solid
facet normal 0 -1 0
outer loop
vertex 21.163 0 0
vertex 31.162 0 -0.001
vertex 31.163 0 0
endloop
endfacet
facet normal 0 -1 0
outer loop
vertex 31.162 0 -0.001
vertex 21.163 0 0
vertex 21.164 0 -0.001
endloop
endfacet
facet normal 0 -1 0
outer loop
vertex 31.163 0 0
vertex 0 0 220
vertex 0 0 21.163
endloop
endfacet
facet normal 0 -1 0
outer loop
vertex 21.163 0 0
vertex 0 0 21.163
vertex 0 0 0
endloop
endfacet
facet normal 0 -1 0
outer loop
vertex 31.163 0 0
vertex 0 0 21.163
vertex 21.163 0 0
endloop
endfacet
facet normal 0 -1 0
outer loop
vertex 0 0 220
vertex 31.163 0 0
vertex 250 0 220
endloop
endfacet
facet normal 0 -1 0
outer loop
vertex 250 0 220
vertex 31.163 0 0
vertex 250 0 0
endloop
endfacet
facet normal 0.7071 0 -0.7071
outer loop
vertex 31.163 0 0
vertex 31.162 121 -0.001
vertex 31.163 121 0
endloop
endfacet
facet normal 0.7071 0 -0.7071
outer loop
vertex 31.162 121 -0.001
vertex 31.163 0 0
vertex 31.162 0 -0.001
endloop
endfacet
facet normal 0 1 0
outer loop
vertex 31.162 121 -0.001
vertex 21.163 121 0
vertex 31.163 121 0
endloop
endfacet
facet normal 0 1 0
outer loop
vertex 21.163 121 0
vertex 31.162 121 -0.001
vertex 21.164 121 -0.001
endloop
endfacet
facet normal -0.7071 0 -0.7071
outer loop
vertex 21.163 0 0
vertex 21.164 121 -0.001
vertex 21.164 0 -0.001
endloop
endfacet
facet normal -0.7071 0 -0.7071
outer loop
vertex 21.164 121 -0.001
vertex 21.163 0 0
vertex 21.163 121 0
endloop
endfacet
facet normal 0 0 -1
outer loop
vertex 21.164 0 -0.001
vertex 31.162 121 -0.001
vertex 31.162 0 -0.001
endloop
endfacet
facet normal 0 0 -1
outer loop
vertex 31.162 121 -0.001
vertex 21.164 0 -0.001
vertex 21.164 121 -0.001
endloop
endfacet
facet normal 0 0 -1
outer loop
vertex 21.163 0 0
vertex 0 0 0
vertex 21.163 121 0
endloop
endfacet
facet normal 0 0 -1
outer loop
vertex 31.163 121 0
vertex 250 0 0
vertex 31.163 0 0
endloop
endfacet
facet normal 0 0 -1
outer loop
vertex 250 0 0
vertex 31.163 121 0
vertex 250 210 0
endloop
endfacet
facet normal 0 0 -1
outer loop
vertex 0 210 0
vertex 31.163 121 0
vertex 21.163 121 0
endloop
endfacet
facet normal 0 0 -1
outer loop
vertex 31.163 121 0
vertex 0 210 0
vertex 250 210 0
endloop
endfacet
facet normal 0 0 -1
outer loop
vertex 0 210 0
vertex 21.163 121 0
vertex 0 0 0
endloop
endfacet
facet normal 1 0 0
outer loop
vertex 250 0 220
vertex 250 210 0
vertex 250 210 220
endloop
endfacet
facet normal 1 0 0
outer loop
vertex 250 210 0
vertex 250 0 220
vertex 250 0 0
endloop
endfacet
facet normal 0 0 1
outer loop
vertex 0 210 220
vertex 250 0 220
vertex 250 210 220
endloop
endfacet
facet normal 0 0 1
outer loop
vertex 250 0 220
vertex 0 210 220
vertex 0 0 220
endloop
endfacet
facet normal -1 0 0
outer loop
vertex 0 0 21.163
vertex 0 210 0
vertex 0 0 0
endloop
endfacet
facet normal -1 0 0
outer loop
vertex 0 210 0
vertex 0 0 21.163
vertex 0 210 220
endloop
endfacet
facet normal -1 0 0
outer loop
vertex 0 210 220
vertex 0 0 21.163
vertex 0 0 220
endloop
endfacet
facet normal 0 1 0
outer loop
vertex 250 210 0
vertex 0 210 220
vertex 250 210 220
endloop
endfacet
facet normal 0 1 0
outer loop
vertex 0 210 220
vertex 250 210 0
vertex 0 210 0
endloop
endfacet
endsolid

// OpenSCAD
$fa = 2;    // minimum angle (fine resolution)
$fs = 0.4;  // minimum size (fine resolution)

use <drawer.scad>  // reusable primitives

epsilon = 0.001;
sq2 = sqrt(2);
northeast = [cos(45), sin(45), 0];
v110 = [1, 1, 0];


leftcard = 12;

length = 278;  // confirmed
width = 121;   // confirmed
height = 27;

tokenwidth = 15;
tokenthickness = 3;
tokenlength = 55;
tokendepth = 12;

clearances_thick = [0.3, 0.4, 0.5];
clearances_width = [0.3, 0.4, 0.5];

clearance_thick = 0.35;
clearance_width = 0.4;

sleevedsmallheight = 73;
sleevedsmallwidth = 46;

cardslength = sleevedsmallwidth + 4;
cardsthickness = 4.5;
cardsdepth = 25;
cardsceiling = sleevedsmallwidth + 2 - cardsdepth;

shoulder_width = 4;
shadow_line_width = 7;
shoulder_overlap = 10;
shoulder_clearance = 0.5;
shoulder_cover_thickness = 1;
tab_relief = 2;

// covers_gap = 4; // need space because single block has two partial caps
covers_gap = 0; // use single full cap, print on diagonal
cap_thickness = 4;
full_cap_chamfer_width = 10; // 0.75 * cap_thickness;
capheight = shoulder_overlap + cardsceiling + cap_thickness;
echo(capheight=capheight);


/*
  -------
       ------
  -------
       ------
       ⋮
  -------
       ------

length == 18.5 * stride + sep / 2 + smallsep + 2 * shoulder_width + 2 * covers_gap
sep = stride - cardsthickness  // distance between cards, also half distance 
                               // from cards to edge

 length == 18.5 * stride + stride / 2 - cardsthickness / 2 + smallsep + 2 * shoulder_width + 2 * covers_gap


∴ length = 19 * stride + 2 * shoulder_width - cardsthickness / 2 + smallsep + 2 * covers_gap

  
*/

smallsep = 2;
stride = (length + cardsthickness / 2 - 2 * shoulder_width - 2 * covers_gap - smallsep) / 19;
sep = stride - cardsthickness;
//echo (sep=sep);



//
//\draw (-1,-1) rectangle +(131,284);
//\draw (0,0) rectangle +(129,282);
//\foreach \i in {0,...,17} {
//  \draw ($(\leftcard,\i*\stride+12.5)$) rectangle +(50mm,4.5mm);
//  \draw ($(\leftcard+54,\i*\stride+12.5)$) rectangle +(50mm,4.5mm);
//}
//\foreach \i in {0,...,17} {
//  \draw ($(9,\i*\stride+6+4.25)$) node[rotate=-45,minimum width=16mm,minimum height=3.8mm,draw] { };
//  \draw ($(9+110,\i*\stride+6+4.25)$) node[rotate=45,minimum width=16mm,minimum height=3.8mm,draw] { };
//}
//\foreach \i in {1,2} {
//  \draw ($(64.5,\i*6*\stride+0.3*\stride+2)$) node [minimum height=2mm,minimum width=80mm,draw]{};
//}

//anti_chamfer_sw(5,30,hi_corner = true,lo_corner = true);


//module undercube(r) {
//  translate([0,0,-r.z]) cube(r);
//}
//
//cube([1,1,1]);
//
//sq2 = sqrt(2);
//
//v = [1,0,0];
//
//translate(-v)
//translate([1-sq2,0,0])
//%undercube([sq2,sq2,sq2]);



module chamfers_test() {
  difference () {
    cube([60,60,15]);
//    translate([15,20,15+epsilon])
//      union () {
//       anti_chamfer_south(5+epsilon,30,lo_corner = true);
//        translate([0,-7,-15])
//          union () {
//          cube([30,7+epsilon,15+epsilon]);
//          translate([epsilon,0,15+epsilon])
//          anti_chamfer_east(5,7,hi_corner = true);
//        }
//      }
    translate([10,40,15-5]) chamfered_well([30,7,5+epsilon],depth=2+epsilon);
  }
}

//chamfers_test();

//translate([0,-30,0]) chamfered_well([30,7,15], 5);


module tokens_test() {
  sep=6;
  depth = 15;
  surround = 3;
  height = depth + 5;

  module well(i) {
    translate([sep + i * (tokenthickness + sep), surround, height-depth+epsilon])
    chamfered_well([tokenthickness+clearances_thick[i],
                    tokenwidth + clearances_width[i],
                    depth],
                   depth=1);
  }

  difference () {
    cube([sep + 3 * (tokenthickness + sep), tokenwidth + 2 * surround, height]);
    well(0);
    well(1);
    well(2);
  }
}

module left_unit () {
  tlen = tokenwidth + clearance_width;
  twid = tokenthickness + clearance_thick;
  tinysep = 2;
  union () {
    translate([0, tlen * sin(45), height - tokendepth])
      rotate([0,0,-45])
      chamfered_well([tlen, twid, tokendepth], depth=1);
    shift = (tlen/2 + twid + tinysep) * northeast;
    lift(height-cardsdepth)
    translate(shift)
      chamfered_well([cardslength,cardsthickness,cardsdepth], 2);
  }
}

module right_unit() {
  mirror([1,0,0]) left_unit();
}

unit_shift = 4;

module unit_test() {
  difference() {
    cube([68, stride + sep / 2 + smallsep, height]);
    translate([unit_shift, smallsep, epsilon])
      left_unit();
  }
}

//translate([0,50,0]) tokens_test();

//translate([-80,-30,0]) unit_test();

// XXX TODO cap needs to be enlarged by clearance!

wedge_clearance = 0.5;
wedgelen = 30;
tablen = wedgelen / 2 - shoulder_width / 4;
tabheight = shoulder_overlap - tab_relief - 1;

module wedge(len, blowup = 1) {
  depth = shoulder_width / 2 + unit_shift - 2;
  translate([0, len * blowup, 0])
    rotate([90,0,0])
    scale(blowup)
    linear_extrude(len)
    polygon([[0,0], [depth, depth/2], [0, tabheight]]);
}

function caplen(groups_covered) = let (
  extra = groups_covered == 1 ? smallsep : sep / 2 - stride / 2
  ) (groups_covered * 6 + 0.5) * stride +
           shoulder_width + extra + (groups_covered - 1) * 2 * covers_gap;


module partial_cap(groups_covered) {
  extra = groups_covered == 1 ? smallsep : sep / 2 - stride / 2;

  difference () {
    cube([width, caplen(groups_covered), capheight]);
    translate(shoulder_width * v110)
      lift(cap_thickness)
      cube([width - 2 * shoulder_width, caplen(groups_covered), capheight]);
    translate(shoulder_width / 2 * v110)
      lift(cap_thickness + cardsceiling)
      cube([width - shoulder_width, caplen(groups_covered), capheight]);
    
  }
  translate([shoulder_width / 2 - epsilon, caplen(groups_covered) - tablen, capheight - tab_relief ])
    mirror([0,0,1]) wedge(tablen);
  translate([width - shoulder_width/2 + epsilon, caplen(groups_covered) - tablen, capheight - tab_relief])
    mirror([0,0,1]) mirror([1,0,0]) wedge(tablen);
}

module full_cap(chamfer_angle = 45) {
  // XXX TODO thumb holes
  // XXX TODO text
  delta = shoulder_cover_thickness;
  difference () {
    cube([width, length, capheight]);
    translate(delta * v110)
      translate([0,0, capheight - shoulder_overlap])
      cube([width - 2 * delta, length - 2 * delta, capheight]);
    translate(shoulder_width * v110)
      translate([0,0, cap_thickness])
      cube([width - 2 * shoulder_width, length - 2 * shoulder_width, capheight]);
//    translate([-epsilon, -epsilon, -epsilon])
//      mirror([0,0,1])
//      anti_chamfer_south(full_cap_chamfer, width + 2 * epsilon);
//    translate([-epsilon, length + epsilon, -epsilon])
//      mirror([0,0,1])
//      anti_chamfer_north(full_cap_chamfer, width + epsilon * 2);
    w = full_cap_chamfer_width;
    translate([-epsilon, w * cos(chamfer_angle), -epsilon])
      rotate([90 - chamfer_angle, 0, 0])
      translate([0,-length,0])
      cube([width + 2 * epsilon, length, capheight]);
    translate([-epsilon, length - w * cos(chamfer_angle), -epsilon])
      rotate([chamfer_angle - 90, 0, 0])
      cube([width + 2 * epsilon, length, capheight]);
  }
  translate([shoulder_cover_thickness - epsilon, (length - wedgelen) / 2, capheight - tab_relief ])
    mirror([0,0,1]) wedge(wedgelen);
  translate([width - shoulder_cover_thickness + epsilon, (length - wedgelen) / 2, capheight - tab_relief])
    mirror([0,0,1]) mirror([1,0,0]) wedge(wedgelen);
}

module tilted_full_cap(theta=45) {
  w = full_cap_chamfer_width;
  translate([0,width,0])
  rotate([0,0,-90])
  translate([0, (capheight - w * sin(theta)) * sin(theta), 0])
  translate([0,w,0])
  rotate([theta, 0, 0])
    translate([0, - w * cos(theta), 0])
    full_cap(theta);
}
    

module supported_full_cap(theta=45) {
  tilted_full_cap(theta);


  fin_length = 0.55 * length;
  fin_thickness = 2;
  fin_gap = 0.75;
  fin_base_length = fin_length * cos(theta);
  fin_height = fin_length * sin(theta);
  fin_base_width = 40;
  w = full_cap_chamfer_width;

  module anti_tooth(d, h) {
    translate([-d/2, -d/2, -h/2])
    cube([d, d, h]);
  }

  module unplaced_sprue() {
    thickness = 0.5;  // from video
    tooth = 0.25;
    length = fin_gap / sin(theta)  + thickness / tan(theta);
    translate([thickness / tan(theta) - length + epsilon, -thickness/2, 0])
      difference() {
        cube([length, thickness, thickness]);
        translate([tooth/cos(theta),0,thickness/2])
          rotate([0, -theta-90, 0])
          anti_tooth(d=tooth, h = 2 * thickness / sin(theta));
        translate([tooth/cos(theta),thickness,thickness/2])
          rotate([0, -theta-90, 0])
          anti_tooth(d=tooth, h = 2 * thickness / sin(theta));
    }
  }

  sprue_vertical_spacing = 10;

  module sprue(i) {
    translate([i * sprue_vertical_spacing / tan(theta), 0, i * sprue_vertical_spacing])
      unplaced_sprue();
  }


  translate([fin_gap / sin(theta),0,0])
  translate([w + (capheight - w * sin(theta)) * sin(theta),width/2,0])
    union () {
      sprue(0);
      for(i=[1:fin_height/sprue_vertical_spacing])
        sprue(i);
      translate([0, fin_thickness/2, 0])
      rotate([90,0,0])
        linear_extrude(fin_thickness)
        polygon([[0,0], [fin_base_length, 0], [fin_base_length, fin_length * sin(theta)]]);
      linear_extrude(fin_thickness)
        hull() {
        translate([10 - 2.5, 0, 0]) circle(r=2.5);
        offset = fin_base_width / 2 + 5;
        translate([fin_base_length - 5, offset, 0])  circle(r=5);
        translate([fin_base_length - 5, -offset, 0]) circle(r=5);
        }
  }

}


module block () { 
  difference () {
    delta = shoulder_cover_thickness + shoulder_clearance;
    union () { // make block with shoulders
      cube([width, length, height - (shoulder_overlap + shadow_line_width)]);
        translate(delta * v110)
        cube([width - 2 * delta, length - 2 * delta, height]);
    }
    for (i = [0:1:17]) {
      gap = i >= 12 ? 2 * covers_gap : (i >= 6 ? covers_gap : 0);
      translate([unit_shift + shoulder_width,
                 shoulder_width + gap + smallsep + i * stride,
                 epsilon])
        render () left_unit();
      translate([width - unit_shift - shoulder_width, shoulder_width + gap + smallsep + i * stride + stride/2, epsilon])
        render () right_unit();
    }
    wedgeheight = height - shoulder_overlap + tab_relief;
    translate([shoulder_width/2 - epsilon, caplen(1) - wedgelen/2, wedgeheight]) wedge(wedgelen);
    translate([width - shoulder_width/2 + epsilon, caplen(1) - wedgelen/2, wedgeheight]) mirror([1,0,0]) wedge(wedgelen);
  }
}

module line (y = 0) {
  translate([0, y - 0.1, height - 5])
    color ("blue") cube([1.5* width, 0.2, 7]);
}


module green() { color("#080") children(); }

if (false) {
  line(0);
  color("red") line(shoulder_width/2);
  line(shoulder_width);
  line(shoulder_width +smallsep);
  line(shoulder_width +smallsep + 1 * stride);
  color("red") line(shoulder_width +smallsep + 1.5 * stride);
  line(shoulder_width +smallsep + 6 * stride);
  line(shoulder_width +smallsep + 6 * stride + covers_gap);
  color("red") line(shoulder_width +smallsep + 6.5 * stride);
  color("red") line(shoulder_width +smallsep + 6.5 * stride + 2 * covers_gap);
  color("red") line(shoulder_width +smallsep + 12.5 * stride);
  color("red") line(shoulder_width +smallsep + 12.5 * stride + 2 * covers_gap);
  line(shoulder_width +smallsep + 12 * stride + covers_gap);
  line(shoulder_width +smallsep + 12 * stride + 2 * covers_gap);
  line(shoulder_width +smallsep + 18 * stride + 2 * covers_gap);
  line(shoulder_width +smallsep + 18.5 * stride + 2 * covers_gap);
  line(shoulder_width +smallsep + 18.5 * stride + 2 * covers_gap + sep/2);
  line(shoulder_width +smallsep + 18.5 * stride + 2 * covers_gap + sep/2 + shoulder_width);

  green() line(length - shoulder_width - sep/2);
  green() line(length - shoulder_width - sep/2 - cardsthickness);
//  translate([5, 0,0]) green() line(length - shoulder_width - sep/2 - 12 * stride - 2 * covers_gap);
  translate([10, 0,3]) color("#0ff") line(length - (shoulder_width + sep/2 + 12 * stride + 2 * covers_gap));
  translate([5,0,0]) green() line(7 * stride + shoulder_width - cardsthickness/2 + smallsep - sep/2);
}

module build_volume() {
  color("Cyan", alpha=0.2) cube([250, 210, 220]);
}


//translate([width+20,0,0]) partial_cap(1);
//translate([width+6,0,2]) partial_cap(2);
//
//translate([width+20,length+1,2]) mirror([0,1,0]) partial_cap(2);

//translate([width+20,0,0]) full_cap();

//block();

//translate([width, 0, height + capheight - shoulder_overlap]) rotate([0,180,0]) partial_cap(1);


//%translate([-5, 0, 0]) %wedge(40);

//wedge(tablen/2);

//tilted_full_cap(15);

//tilted_full_cap(45);
supported_full_cap(45);
build_volume();
